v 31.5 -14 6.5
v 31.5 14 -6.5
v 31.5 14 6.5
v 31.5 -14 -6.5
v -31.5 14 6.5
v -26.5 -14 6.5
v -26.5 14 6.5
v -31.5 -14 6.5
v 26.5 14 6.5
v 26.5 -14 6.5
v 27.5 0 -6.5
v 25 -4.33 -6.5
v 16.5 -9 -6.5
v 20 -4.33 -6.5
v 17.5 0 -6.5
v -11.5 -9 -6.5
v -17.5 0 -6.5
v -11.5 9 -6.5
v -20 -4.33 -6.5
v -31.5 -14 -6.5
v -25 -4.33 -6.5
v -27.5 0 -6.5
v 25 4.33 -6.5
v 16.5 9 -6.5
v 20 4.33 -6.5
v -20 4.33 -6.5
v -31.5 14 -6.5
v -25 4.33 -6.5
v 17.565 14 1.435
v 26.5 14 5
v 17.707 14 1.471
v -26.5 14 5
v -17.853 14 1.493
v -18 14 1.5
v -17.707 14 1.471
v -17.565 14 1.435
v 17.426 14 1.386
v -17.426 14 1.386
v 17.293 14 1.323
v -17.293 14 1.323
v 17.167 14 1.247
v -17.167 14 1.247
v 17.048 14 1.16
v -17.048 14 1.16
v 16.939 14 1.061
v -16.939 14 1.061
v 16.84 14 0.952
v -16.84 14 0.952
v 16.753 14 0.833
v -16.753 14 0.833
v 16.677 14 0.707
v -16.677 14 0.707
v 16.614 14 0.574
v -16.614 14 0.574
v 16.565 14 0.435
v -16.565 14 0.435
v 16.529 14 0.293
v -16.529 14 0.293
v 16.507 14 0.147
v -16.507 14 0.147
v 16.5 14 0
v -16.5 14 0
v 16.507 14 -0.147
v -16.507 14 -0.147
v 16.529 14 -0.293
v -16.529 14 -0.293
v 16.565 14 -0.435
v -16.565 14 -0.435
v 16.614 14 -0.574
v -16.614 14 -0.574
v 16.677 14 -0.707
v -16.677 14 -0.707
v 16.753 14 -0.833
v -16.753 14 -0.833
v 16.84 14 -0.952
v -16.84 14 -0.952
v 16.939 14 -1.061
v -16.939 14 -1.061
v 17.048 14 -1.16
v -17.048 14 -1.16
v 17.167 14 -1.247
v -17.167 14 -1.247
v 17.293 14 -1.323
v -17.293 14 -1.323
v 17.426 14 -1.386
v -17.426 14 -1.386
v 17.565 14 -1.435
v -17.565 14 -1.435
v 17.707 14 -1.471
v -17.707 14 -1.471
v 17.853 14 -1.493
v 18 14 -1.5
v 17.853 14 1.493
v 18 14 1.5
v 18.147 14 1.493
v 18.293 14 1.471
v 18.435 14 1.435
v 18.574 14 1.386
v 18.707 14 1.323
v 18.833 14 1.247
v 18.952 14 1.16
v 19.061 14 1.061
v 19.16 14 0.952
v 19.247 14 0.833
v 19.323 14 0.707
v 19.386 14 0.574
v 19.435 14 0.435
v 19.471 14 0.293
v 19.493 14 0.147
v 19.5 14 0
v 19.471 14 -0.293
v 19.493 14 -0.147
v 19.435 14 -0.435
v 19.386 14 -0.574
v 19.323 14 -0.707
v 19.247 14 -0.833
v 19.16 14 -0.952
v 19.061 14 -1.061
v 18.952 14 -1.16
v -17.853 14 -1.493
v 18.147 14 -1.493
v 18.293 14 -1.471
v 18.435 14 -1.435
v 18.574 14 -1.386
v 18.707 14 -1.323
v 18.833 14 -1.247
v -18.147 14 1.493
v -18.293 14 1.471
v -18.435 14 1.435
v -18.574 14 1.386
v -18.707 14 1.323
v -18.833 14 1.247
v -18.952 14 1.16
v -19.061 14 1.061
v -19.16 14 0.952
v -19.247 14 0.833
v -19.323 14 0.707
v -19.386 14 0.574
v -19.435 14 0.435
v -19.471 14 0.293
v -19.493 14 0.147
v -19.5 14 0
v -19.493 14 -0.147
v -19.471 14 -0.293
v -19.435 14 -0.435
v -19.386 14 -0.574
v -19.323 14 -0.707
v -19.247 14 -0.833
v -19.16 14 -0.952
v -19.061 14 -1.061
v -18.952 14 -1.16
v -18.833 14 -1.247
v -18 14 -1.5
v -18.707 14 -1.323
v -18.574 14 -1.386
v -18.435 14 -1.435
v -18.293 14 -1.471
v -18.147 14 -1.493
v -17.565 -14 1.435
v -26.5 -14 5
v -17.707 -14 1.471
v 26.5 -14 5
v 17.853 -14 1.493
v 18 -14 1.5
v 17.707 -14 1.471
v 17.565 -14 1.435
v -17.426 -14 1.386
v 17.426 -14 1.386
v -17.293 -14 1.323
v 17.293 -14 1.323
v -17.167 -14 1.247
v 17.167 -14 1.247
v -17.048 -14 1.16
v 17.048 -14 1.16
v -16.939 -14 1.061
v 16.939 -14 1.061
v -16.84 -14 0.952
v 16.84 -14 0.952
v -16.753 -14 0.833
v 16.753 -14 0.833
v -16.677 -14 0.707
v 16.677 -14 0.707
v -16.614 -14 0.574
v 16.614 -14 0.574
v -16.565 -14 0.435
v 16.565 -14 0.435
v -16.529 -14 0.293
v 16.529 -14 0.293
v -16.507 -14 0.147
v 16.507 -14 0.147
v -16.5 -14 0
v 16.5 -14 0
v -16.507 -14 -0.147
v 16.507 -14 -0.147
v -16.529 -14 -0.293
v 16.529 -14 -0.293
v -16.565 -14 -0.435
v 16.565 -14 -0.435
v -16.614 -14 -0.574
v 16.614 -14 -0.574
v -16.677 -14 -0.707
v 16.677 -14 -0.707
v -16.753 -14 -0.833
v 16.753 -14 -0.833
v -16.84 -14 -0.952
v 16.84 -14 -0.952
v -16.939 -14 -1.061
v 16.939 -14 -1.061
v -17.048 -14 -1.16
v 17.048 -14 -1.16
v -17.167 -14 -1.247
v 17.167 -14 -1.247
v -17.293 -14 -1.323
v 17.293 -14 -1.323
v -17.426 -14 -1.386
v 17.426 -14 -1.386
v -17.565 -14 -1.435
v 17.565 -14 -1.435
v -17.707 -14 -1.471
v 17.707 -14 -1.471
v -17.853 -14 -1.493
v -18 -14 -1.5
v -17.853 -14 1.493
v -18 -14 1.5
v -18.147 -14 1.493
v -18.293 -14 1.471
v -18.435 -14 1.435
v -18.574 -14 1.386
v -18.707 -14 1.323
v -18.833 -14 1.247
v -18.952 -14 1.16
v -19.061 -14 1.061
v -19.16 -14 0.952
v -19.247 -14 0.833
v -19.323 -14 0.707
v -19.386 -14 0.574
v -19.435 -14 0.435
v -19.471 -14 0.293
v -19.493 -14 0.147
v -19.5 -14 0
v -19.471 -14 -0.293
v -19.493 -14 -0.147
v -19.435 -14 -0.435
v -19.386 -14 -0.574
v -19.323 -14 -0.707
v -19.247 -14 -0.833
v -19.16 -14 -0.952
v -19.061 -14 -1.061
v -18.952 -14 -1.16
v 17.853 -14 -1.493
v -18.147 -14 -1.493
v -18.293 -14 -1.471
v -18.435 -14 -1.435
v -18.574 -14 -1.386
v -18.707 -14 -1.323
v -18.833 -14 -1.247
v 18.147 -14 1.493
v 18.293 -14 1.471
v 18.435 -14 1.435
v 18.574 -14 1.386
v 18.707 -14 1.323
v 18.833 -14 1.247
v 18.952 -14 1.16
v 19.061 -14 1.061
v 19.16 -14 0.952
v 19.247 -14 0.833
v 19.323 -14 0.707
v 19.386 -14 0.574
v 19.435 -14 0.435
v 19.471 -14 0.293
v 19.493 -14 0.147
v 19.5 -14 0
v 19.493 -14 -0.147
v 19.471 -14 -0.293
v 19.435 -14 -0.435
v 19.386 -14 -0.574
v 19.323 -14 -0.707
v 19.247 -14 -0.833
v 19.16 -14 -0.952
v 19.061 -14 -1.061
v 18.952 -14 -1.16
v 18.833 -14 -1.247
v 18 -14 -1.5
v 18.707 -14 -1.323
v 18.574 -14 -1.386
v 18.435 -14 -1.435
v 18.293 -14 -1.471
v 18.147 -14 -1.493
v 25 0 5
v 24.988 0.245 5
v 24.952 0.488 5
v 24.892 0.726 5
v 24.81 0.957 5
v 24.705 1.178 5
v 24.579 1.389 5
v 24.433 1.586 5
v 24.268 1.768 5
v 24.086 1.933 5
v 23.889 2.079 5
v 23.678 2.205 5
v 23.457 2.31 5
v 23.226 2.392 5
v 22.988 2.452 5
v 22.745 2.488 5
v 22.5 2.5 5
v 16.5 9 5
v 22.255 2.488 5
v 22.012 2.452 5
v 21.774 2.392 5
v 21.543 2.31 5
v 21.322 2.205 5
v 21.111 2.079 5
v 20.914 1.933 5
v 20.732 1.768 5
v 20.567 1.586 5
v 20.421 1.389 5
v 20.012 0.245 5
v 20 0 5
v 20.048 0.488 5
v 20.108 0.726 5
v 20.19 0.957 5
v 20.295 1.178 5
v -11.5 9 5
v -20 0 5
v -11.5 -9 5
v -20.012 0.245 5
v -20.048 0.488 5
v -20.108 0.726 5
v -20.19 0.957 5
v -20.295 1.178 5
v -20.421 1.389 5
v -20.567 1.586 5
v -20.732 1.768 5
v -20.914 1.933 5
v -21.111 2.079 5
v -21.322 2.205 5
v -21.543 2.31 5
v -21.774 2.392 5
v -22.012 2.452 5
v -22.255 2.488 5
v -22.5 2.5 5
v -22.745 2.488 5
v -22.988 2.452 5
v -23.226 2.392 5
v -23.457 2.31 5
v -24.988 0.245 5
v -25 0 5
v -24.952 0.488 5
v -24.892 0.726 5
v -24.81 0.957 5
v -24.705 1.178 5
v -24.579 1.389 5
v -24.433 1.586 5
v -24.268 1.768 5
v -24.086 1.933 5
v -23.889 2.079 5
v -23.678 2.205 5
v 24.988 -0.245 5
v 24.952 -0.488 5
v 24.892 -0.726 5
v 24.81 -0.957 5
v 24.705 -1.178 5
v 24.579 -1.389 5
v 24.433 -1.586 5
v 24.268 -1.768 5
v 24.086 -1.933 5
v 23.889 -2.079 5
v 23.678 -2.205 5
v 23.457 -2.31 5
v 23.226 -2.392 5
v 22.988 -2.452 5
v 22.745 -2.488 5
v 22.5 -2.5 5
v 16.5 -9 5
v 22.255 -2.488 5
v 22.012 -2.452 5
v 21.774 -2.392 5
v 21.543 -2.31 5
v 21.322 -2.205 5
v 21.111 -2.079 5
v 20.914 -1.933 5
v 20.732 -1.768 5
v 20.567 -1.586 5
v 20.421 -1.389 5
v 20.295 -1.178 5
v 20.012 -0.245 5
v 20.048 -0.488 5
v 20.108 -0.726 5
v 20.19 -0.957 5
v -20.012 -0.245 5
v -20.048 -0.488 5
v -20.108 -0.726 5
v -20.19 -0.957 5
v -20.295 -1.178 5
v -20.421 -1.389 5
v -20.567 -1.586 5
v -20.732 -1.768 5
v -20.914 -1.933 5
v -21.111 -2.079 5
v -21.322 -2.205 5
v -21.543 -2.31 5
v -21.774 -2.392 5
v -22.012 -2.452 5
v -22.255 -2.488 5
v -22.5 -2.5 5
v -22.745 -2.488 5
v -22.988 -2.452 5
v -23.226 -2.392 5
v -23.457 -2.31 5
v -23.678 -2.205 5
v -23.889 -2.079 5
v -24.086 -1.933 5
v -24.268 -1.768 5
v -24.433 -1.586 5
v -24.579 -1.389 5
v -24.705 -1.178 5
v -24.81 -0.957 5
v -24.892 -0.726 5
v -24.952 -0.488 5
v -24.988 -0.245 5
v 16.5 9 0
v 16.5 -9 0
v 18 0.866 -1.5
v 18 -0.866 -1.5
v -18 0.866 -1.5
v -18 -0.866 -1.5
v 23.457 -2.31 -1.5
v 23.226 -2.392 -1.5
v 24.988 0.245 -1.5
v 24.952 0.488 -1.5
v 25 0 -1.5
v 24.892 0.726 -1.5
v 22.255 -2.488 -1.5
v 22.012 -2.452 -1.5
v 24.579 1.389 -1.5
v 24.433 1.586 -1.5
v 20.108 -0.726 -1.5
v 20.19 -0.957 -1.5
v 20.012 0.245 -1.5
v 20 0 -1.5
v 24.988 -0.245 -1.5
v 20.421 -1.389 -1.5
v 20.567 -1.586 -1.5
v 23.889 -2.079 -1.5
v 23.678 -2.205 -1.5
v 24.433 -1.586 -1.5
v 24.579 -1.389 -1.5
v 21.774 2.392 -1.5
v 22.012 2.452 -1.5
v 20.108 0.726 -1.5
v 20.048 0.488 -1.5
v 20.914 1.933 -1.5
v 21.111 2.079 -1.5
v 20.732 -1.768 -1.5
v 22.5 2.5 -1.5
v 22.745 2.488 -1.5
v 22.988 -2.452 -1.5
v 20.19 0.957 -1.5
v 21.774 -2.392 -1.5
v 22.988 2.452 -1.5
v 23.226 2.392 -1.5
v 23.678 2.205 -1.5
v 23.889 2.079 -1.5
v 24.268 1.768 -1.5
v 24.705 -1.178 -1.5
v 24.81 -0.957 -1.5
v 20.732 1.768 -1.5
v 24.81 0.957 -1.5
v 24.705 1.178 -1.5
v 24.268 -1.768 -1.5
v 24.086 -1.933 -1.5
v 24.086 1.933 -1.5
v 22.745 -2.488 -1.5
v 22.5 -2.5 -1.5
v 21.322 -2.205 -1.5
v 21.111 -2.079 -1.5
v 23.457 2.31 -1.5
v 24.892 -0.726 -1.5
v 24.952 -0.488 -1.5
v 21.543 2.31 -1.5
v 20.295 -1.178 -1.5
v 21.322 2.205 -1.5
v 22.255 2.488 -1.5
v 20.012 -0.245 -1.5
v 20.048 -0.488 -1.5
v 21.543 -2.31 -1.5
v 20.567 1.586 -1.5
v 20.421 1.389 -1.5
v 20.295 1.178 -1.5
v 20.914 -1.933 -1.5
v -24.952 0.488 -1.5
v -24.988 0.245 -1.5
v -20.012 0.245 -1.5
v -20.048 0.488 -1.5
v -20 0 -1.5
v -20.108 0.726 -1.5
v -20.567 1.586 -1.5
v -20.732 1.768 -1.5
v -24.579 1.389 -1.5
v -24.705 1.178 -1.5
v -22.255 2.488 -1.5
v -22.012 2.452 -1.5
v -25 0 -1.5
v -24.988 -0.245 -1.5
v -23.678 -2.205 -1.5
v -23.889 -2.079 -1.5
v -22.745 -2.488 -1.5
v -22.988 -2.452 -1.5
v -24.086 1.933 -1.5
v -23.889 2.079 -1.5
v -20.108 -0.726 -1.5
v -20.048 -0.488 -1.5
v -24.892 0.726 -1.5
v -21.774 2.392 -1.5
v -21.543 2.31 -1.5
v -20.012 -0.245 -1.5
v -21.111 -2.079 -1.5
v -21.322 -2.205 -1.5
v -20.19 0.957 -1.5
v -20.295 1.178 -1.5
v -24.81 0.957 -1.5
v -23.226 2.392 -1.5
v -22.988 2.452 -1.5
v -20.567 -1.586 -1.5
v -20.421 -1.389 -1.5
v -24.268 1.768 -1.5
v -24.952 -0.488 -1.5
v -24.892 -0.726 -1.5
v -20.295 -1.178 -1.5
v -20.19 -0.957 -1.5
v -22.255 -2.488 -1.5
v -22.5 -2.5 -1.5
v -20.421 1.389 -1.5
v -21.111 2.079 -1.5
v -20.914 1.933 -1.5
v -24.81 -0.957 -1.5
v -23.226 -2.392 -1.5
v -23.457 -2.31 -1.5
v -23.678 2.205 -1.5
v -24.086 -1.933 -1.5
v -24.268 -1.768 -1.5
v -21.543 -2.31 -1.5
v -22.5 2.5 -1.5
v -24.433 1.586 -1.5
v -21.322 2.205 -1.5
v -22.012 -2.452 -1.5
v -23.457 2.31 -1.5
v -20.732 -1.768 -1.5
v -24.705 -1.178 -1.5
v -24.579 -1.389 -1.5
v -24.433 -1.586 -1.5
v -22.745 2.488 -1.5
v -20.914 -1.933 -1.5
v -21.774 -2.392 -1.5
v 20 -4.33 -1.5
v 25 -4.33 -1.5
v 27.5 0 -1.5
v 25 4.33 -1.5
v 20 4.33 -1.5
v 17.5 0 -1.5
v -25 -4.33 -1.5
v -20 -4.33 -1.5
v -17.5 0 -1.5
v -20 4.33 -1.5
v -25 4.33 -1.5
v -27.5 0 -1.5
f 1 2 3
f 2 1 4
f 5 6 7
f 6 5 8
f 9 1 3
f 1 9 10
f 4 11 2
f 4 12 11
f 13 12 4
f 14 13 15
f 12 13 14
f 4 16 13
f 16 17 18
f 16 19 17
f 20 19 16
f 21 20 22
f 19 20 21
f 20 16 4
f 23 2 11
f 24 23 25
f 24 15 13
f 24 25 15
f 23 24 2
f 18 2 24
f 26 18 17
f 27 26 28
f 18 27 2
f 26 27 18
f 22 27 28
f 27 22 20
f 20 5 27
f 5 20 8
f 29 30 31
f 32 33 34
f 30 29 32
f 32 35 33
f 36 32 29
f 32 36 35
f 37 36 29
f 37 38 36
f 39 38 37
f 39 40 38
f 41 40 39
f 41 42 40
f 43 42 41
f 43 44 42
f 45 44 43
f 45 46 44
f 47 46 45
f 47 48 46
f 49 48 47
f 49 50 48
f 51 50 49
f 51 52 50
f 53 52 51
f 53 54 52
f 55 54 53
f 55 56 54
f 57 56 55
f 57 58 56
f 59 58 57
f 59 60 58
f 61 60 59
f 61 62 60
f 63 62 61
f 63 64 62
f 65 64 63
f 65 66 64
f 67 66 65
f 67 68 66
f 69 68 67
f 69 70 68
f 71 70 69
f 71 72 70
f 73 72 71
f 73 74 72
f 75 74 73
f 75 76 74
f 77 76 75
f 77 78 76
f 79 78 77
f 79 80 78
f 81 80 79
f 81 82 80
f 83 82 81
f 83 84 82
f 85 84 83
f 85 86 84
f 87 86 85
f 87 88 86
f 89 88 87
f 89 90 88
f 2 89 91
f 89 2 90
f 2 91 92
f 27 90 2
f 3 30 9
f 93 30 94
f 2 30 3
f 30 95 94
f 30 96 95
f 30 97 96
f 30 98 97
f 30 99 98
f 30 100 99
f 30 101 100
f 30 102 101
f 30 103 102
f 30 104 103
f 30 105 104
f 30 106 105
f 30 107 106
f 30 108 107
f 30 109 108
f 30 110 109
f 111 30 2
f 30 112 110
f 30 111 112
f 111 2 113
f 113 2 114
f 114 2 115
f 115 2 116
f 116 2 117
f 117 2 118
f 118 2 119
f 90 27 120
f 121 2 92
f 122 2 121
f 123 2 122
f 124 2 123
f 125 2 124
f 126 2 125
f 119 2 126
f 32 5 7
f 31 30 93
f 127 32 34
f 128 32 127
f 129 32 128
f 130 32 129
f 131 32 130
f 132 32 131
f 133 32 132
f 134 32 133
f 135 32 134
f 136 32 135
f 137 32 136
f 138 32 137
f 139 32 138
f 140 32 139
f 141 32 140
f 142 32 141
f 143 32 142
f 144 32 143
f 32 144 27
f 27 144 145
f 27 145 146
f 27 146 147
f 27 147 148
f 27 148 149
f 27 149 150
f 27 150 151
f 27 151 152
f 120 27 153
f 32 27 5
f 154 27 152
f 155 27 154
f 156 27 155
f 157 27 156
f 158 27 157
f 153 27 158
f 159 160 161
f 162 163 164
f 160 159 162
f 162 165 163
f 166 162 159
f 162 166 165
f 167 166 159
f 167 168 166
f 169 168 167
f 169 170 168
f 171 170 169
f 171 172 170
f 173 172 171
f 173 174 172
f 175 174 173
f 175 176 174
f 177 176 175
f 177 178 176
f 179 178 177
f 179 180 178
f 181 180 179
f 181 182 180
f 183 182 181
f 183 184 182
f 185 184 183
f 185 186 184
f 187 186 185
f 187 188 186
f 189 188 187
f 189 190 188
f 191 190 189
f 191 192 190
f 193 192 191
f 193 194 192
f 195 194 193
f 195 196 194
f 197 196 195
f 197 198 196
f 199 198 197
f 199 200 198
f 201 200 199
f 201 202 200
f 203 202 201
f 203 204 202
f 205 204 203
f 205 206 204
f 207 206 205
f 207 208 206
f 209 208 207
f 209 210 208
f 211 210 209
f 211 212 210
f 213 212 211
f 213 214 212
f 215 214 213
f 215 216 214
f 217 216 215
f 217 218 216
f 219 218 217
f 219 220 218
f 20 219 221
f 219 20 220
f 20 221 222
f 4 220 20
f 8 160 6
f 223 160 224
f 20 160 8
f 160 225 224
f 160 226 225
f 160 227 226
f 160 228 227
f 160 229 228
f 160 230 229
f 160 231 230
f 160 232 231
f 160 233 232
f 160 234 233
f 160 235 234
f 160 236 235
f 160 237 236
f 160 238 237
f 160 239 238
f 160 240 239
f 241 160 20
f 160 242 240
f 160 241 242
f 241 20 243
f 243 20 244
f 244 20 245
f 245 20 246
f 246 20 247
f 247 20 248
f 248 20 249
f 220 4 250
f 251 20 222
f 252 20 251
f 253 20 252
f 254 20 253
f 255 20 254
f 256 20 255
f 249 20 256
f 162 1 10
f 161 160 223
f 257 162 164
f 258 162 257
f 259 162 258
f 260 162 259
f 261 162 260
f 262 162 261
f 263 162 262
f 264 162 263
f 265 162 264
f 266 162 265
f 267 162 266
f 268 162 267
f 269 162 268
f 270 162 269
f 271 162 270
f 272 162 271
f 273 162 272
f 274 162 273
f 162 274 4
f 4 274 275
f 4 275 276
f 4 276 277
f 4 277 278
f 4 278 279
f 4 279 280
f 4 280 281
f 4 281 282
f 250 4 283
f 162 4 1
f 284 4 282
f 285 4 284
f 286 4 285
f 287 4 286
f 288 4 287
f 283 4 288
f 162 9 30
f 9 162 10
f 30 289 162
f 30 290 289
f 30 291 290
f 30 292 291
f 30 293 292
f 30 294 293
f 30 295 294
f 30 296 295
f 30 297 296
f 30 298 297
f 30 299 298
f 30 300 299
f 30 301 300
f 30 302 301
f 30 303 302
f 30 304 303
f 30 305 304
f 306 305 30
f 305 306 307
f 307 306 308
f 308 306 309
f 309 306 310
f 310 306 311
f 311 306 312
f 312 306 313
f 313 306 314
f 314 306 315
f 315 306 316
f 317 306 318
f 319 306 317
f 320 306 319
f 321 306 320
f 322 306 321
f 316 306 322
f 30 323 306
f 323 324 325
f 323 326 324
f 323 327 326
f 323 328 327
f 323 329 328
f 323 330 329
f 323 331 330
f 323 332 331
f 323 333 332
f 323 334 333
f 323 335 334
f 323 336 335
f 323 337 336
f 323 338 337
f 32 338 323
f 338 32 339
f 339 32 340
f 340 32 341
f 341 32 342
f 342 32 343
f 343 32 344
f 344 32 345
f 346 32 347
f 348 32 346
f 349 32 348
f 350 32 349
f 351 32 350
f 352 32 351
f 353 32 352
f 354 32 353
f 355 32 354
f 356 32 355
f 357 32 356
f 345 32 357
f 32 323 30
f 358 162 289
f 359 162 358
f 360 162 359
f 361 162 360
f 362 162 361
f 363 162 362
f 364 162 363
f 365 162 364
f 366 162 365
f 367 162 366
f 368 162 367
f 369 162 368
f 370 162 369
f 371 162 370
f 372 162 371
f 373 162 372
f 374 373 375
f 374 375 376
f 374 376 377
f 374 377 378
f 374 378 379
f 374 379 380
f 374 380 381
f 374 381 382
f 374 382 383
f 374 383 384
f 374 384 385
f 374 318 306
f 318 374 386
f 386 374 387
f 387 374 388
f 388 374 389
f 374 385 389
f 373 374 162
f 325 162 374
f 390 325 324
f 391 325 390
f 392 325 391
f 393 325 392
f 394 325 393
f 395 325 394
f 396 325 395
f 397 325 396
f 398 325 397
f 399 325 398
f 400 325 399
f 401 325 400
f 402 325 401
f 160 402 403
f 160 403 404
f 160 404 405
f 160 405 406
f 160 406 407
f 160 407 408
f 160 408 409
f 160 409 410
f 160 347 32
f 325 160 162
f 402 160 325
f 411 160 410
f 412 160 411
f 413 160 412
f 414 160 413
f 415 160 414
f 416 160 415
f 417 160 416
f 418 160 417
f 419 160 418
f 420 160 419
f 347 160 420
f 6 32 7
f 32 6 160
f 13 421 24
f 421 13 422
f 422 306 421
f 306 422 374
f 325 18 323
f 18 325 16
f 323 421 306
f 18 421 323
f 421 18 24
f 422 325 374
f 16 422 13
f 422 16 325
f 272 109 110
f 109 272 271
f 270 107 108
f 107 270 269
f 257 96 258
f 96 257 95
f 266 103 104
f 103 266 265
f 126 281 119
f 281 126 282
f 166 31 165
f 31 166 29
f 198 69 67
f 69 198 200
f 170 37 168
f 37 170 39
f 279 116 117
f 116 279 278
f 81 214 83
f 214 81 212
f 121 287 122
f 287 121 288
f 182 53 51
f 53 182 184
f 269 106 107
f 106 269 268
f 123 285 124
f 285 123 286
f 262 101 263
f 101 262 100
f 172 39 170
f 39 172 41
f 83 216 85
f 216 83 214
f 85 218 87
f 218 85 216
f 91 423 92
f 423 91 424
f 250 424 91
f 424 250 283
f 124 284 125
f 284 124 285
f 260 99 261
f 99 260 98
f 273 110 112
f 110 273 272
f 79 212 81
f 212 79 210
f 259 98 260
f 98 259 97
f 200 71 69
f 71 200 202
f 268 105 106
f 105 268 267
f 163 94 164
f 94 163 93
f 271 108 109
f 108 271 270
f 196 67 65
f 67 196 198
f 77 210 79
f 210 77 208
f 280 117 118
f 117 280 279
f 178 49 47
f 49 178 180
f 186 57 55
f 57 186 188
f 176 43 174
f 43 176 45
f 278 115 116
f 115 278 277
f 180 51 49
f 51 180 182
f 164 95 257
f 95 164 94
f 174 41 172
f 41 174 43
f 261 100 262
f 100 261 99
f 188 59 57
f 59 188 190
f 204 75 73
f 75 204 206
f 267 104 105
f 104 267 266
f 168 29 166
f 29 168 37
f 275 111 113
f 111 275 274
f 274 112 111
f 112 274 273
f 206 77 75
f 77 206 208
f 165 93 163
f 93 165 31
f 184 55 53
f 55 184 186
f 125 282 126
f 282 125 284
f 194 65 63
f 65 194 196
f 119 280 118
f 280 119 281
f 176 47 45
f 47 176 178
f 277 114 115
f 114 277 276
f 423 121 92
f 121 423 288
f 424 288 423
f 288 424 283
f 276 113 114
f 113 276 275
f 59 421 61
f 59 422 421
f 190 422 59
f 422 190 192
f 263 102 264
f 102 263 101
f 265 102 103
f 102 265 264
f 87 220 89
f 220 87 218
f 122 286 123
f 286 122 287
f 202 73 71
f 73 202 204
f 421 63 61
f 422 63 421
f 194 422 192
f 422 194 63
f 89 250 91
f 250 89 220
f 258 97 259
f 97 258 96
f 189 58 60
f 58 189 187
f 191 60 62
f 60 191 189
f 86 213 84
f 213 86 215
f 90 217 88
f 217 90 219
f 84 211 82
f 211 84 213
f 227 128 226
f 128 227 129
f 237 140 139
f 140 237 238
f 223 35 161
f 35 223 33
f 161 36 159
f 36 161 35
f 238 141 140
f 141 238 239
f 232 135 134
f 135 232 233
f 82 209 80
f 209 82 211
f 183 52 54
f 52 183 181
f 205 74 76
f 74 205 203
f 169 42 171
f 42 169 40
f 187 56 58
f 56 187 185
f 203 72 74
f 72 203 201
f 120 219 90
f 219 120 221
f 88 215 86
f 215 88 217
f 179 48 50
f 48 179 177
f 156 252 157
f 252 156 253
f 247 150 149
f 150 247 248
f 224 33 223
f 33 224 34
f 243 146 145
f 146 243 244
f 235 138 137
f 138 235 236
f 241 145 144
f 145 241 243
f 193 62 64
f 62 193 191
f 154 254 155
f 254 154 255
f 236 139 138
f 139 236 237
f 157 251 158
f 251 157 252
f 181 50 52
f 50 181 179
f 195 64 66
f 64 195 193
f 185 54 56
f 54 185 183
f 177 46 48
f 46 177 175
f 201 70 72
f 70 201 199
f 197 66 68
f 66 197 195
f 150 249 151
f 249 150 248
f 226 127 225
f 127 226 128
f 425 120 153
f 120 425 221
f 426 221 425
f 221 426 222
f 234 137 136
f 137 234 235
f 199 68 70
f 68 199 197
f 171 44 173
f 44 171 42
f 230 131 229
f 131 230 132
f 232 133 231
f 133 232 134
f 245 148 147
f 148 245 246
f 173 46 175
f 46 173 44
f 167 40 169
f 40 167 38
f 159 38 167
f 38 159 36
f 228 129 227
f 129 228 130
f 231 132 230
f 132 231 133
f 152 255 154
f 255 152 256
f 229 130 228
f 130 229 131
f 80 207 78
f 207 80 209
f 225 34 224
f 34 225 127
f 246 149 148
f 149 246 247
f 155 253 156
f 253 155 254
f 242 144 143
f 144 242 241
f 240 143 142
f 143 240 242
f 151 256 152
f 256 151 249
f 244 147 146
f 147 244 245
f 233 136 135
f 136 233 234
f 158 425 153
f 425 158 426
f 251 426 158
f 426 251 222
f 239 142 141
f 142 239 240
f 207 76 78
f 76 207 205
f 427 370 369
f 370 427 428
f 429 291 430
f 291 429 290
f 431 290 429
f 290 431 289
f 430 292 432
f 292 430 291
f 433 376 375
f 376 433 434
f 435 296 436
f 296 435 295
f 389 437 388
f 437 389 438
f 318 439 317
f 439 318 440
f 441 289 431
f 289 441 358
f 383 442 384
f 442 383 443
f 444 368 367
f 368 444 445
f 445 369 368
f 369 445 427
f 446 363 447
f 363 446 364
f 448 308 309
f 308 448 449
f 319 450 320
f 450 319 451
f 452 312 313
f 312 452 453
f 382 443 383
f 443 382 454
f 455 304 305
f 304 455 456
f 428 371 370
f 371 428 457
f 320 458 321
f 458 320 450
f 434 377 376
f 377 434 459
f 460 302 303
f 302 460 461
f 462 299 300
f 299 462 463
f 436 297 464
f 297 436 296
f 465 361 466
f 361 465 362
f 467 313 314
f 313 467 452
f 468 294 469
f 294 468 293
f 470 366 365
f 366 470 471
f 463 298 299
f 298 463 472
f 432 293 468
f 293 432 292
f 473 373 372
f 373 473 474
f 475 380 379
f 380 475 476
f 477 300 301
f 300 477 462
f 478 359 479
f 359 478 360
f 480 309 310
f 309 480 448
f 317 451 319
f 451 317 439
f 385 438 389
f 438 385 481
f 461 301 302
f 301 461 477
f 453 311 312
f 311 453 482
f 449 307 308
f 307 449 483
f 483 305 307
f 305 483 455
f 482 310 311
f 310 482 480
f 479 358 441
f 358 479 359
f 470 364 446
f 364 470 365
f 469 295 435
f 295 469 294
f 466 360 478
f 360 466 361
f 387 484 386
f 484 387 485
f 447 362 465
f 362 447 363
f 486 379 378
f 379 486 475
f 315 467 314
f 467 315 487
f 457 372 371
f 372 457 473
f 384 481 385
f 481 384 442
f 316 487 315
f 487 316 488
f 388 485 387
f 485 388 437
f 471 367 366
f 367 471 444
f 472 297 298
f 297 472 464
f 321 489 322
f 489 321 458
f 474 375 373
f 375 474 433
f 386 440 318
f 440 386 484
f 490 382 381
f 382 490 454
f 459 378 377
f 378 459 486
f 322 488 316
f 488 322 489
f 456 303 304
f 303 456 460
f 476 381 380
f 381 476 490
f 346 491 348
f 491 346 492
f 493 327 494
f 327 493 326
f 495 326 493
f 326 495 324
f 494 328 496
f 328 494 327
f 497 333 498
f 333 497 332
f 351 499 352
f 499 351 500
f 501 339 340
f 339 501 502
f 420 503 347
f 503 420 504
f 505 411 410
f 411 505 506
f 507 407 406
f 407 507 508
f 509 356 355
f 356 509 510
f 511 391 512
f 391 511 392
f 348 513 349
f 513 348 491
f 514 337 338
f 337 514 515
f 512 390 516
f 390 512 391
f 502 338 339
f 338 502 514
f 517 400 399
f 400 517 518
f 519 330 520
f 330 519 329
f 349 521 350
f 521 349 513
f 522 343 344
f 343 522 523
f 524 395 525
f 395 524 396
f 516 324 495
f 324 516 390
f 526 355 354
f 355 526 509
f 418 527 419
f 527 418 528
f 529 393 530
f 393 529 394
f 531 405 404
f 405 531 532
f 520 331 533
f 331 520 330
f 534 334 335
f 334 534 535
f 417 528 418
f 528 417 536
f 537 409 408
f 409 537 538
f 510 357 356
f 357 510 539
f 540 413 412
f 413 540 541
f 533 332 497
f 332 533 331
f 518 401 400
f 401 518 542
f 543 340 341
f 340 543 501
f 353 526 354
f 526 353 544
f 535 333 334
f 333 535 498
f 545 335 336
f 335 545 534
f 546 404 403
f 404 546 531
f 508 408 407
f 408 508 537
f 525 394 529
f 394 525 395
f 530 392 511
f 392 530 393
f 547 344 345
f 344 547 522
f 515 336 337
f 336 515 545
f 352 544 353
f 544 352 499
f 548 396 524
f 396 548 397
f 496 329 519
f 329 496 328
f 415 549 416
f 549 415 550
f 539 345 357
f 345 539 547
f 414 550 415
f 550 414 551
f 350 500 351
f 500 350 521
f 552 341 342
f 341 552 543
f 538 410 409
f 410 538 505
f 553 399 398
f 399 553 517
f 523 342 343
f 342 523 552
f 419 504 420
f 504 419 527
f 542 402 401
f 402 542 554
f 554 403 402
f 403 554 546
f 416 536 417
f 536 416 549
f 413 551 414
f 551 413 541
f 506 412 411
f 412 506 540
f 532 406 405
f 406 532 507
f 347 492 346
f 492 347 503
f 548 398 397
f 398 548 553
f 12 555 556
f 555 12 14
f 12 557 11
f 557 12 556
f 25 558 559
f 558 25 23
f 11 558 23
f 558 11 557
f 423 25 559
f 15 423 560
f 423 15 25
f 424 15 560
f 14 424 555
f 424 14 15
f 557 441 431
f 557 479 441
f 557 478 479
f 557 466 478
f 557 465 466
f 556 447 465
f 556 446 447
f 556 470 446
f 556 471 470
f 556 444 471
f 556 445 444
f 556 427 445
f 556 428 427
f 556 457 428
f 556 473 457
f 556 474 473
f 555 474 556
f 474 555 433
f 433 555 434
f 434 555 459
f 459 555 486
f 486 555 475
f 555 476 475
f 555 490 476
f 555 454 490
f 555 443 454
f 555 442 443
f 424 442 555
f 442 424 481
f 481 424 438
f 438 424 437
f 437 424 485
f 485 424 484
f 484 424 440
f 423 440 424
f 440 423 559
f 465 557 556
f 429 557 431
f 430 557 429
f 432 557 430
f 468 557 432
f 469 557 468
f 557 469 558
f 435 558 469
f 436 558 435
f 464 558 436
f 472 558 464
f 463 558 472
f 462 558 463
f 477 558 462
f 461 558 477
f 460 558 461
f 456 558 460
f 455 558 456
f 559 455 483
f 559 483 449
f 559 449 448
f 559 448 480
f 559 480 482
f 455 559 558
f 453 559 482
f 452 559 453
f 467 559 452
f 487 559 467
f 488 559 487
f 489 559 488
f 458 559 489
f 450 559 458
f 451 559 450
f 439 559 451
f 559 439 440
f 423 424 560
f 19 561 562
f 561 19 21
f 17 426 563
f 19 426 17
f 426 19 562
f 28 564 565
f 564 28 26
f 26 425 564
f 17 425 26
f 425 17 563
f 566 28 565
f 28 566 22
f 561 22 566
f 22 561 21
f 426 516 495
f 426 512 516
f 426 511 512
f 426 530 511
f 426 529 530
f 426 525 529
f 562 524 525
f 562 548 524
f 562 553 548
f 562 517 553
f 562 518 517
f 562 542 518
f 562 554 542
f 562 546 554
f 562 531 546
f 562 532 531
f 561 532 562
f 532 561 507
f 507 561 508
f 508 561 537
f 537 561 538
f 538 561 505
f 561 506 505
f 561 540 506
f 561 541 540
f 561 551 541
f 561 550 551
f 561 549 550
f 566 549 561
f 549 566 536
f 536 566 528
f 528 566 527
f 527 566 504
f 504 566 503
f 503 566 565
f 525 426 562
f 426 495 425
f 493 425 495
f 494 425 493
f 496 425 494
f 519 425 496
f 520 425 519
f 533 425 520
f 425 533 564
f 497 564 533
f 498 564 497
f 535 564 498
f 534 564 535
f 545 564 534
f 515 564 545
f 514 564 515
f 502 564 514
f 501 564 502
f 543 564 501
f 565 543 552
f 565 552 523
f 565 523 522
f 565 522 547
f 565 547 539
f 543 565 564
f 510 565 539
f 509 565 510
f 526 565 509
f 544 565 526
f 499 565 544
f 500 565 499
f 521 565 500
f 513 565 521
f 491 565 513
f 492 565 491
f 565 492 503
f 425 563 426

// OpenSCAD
bw = 53;  // bracket width
xw = 5;    // extension width past bracket
xt = 3;    // xtension thickness

cw = 28;   // clip width
co = 2.5;  // clip offset (widthwise)
ch = 18;   // clip height
xh = 5;    // extra each side of clip

tt = 10;    // thickness of whole thing less extensions

td = 3;    // cable tie hole diameter

mw = 45;   // mounting hole width
md = 5;    // mounting hole diameter
nd = 10;    // nut diameter (point to point not AF
nt = 5;     // nut thickness

$fn=64;

difference() {
    cube([bw+xw*2,ch+xh*2,tt+xt], center=true);
    translate([0,0,tt/2+5]) cube([bw, ch+xh*2+2, 10], center=true);
    translate([co,0,0]) cube([cw,ch,tt+xt+2], center=true);
    translate([cw/2+co+td/2,0,0]) rotate([90,0,0]) cylinder(h=1000, d=td, center=true); 
    translate([-cw/2-co-td/2,0,0]) rotate([90,0,0]) cylinder(h=1000, d=td, center=true); 
    translate([mw/2,0,0]) cylinder(h=1000,d=md,center=true);
    translate([-mw/2,0,0]) cylinder(h=1000,d=md,center=true);
    translate([mw/2,0,-tt-xt/2]) cylinder(h=nt*2,d=nd,$fn=6);
    translate([-mw/2,0,-tt-xt/2]) cylinder(h=nt*2,d=nd,$fn=6);
}
